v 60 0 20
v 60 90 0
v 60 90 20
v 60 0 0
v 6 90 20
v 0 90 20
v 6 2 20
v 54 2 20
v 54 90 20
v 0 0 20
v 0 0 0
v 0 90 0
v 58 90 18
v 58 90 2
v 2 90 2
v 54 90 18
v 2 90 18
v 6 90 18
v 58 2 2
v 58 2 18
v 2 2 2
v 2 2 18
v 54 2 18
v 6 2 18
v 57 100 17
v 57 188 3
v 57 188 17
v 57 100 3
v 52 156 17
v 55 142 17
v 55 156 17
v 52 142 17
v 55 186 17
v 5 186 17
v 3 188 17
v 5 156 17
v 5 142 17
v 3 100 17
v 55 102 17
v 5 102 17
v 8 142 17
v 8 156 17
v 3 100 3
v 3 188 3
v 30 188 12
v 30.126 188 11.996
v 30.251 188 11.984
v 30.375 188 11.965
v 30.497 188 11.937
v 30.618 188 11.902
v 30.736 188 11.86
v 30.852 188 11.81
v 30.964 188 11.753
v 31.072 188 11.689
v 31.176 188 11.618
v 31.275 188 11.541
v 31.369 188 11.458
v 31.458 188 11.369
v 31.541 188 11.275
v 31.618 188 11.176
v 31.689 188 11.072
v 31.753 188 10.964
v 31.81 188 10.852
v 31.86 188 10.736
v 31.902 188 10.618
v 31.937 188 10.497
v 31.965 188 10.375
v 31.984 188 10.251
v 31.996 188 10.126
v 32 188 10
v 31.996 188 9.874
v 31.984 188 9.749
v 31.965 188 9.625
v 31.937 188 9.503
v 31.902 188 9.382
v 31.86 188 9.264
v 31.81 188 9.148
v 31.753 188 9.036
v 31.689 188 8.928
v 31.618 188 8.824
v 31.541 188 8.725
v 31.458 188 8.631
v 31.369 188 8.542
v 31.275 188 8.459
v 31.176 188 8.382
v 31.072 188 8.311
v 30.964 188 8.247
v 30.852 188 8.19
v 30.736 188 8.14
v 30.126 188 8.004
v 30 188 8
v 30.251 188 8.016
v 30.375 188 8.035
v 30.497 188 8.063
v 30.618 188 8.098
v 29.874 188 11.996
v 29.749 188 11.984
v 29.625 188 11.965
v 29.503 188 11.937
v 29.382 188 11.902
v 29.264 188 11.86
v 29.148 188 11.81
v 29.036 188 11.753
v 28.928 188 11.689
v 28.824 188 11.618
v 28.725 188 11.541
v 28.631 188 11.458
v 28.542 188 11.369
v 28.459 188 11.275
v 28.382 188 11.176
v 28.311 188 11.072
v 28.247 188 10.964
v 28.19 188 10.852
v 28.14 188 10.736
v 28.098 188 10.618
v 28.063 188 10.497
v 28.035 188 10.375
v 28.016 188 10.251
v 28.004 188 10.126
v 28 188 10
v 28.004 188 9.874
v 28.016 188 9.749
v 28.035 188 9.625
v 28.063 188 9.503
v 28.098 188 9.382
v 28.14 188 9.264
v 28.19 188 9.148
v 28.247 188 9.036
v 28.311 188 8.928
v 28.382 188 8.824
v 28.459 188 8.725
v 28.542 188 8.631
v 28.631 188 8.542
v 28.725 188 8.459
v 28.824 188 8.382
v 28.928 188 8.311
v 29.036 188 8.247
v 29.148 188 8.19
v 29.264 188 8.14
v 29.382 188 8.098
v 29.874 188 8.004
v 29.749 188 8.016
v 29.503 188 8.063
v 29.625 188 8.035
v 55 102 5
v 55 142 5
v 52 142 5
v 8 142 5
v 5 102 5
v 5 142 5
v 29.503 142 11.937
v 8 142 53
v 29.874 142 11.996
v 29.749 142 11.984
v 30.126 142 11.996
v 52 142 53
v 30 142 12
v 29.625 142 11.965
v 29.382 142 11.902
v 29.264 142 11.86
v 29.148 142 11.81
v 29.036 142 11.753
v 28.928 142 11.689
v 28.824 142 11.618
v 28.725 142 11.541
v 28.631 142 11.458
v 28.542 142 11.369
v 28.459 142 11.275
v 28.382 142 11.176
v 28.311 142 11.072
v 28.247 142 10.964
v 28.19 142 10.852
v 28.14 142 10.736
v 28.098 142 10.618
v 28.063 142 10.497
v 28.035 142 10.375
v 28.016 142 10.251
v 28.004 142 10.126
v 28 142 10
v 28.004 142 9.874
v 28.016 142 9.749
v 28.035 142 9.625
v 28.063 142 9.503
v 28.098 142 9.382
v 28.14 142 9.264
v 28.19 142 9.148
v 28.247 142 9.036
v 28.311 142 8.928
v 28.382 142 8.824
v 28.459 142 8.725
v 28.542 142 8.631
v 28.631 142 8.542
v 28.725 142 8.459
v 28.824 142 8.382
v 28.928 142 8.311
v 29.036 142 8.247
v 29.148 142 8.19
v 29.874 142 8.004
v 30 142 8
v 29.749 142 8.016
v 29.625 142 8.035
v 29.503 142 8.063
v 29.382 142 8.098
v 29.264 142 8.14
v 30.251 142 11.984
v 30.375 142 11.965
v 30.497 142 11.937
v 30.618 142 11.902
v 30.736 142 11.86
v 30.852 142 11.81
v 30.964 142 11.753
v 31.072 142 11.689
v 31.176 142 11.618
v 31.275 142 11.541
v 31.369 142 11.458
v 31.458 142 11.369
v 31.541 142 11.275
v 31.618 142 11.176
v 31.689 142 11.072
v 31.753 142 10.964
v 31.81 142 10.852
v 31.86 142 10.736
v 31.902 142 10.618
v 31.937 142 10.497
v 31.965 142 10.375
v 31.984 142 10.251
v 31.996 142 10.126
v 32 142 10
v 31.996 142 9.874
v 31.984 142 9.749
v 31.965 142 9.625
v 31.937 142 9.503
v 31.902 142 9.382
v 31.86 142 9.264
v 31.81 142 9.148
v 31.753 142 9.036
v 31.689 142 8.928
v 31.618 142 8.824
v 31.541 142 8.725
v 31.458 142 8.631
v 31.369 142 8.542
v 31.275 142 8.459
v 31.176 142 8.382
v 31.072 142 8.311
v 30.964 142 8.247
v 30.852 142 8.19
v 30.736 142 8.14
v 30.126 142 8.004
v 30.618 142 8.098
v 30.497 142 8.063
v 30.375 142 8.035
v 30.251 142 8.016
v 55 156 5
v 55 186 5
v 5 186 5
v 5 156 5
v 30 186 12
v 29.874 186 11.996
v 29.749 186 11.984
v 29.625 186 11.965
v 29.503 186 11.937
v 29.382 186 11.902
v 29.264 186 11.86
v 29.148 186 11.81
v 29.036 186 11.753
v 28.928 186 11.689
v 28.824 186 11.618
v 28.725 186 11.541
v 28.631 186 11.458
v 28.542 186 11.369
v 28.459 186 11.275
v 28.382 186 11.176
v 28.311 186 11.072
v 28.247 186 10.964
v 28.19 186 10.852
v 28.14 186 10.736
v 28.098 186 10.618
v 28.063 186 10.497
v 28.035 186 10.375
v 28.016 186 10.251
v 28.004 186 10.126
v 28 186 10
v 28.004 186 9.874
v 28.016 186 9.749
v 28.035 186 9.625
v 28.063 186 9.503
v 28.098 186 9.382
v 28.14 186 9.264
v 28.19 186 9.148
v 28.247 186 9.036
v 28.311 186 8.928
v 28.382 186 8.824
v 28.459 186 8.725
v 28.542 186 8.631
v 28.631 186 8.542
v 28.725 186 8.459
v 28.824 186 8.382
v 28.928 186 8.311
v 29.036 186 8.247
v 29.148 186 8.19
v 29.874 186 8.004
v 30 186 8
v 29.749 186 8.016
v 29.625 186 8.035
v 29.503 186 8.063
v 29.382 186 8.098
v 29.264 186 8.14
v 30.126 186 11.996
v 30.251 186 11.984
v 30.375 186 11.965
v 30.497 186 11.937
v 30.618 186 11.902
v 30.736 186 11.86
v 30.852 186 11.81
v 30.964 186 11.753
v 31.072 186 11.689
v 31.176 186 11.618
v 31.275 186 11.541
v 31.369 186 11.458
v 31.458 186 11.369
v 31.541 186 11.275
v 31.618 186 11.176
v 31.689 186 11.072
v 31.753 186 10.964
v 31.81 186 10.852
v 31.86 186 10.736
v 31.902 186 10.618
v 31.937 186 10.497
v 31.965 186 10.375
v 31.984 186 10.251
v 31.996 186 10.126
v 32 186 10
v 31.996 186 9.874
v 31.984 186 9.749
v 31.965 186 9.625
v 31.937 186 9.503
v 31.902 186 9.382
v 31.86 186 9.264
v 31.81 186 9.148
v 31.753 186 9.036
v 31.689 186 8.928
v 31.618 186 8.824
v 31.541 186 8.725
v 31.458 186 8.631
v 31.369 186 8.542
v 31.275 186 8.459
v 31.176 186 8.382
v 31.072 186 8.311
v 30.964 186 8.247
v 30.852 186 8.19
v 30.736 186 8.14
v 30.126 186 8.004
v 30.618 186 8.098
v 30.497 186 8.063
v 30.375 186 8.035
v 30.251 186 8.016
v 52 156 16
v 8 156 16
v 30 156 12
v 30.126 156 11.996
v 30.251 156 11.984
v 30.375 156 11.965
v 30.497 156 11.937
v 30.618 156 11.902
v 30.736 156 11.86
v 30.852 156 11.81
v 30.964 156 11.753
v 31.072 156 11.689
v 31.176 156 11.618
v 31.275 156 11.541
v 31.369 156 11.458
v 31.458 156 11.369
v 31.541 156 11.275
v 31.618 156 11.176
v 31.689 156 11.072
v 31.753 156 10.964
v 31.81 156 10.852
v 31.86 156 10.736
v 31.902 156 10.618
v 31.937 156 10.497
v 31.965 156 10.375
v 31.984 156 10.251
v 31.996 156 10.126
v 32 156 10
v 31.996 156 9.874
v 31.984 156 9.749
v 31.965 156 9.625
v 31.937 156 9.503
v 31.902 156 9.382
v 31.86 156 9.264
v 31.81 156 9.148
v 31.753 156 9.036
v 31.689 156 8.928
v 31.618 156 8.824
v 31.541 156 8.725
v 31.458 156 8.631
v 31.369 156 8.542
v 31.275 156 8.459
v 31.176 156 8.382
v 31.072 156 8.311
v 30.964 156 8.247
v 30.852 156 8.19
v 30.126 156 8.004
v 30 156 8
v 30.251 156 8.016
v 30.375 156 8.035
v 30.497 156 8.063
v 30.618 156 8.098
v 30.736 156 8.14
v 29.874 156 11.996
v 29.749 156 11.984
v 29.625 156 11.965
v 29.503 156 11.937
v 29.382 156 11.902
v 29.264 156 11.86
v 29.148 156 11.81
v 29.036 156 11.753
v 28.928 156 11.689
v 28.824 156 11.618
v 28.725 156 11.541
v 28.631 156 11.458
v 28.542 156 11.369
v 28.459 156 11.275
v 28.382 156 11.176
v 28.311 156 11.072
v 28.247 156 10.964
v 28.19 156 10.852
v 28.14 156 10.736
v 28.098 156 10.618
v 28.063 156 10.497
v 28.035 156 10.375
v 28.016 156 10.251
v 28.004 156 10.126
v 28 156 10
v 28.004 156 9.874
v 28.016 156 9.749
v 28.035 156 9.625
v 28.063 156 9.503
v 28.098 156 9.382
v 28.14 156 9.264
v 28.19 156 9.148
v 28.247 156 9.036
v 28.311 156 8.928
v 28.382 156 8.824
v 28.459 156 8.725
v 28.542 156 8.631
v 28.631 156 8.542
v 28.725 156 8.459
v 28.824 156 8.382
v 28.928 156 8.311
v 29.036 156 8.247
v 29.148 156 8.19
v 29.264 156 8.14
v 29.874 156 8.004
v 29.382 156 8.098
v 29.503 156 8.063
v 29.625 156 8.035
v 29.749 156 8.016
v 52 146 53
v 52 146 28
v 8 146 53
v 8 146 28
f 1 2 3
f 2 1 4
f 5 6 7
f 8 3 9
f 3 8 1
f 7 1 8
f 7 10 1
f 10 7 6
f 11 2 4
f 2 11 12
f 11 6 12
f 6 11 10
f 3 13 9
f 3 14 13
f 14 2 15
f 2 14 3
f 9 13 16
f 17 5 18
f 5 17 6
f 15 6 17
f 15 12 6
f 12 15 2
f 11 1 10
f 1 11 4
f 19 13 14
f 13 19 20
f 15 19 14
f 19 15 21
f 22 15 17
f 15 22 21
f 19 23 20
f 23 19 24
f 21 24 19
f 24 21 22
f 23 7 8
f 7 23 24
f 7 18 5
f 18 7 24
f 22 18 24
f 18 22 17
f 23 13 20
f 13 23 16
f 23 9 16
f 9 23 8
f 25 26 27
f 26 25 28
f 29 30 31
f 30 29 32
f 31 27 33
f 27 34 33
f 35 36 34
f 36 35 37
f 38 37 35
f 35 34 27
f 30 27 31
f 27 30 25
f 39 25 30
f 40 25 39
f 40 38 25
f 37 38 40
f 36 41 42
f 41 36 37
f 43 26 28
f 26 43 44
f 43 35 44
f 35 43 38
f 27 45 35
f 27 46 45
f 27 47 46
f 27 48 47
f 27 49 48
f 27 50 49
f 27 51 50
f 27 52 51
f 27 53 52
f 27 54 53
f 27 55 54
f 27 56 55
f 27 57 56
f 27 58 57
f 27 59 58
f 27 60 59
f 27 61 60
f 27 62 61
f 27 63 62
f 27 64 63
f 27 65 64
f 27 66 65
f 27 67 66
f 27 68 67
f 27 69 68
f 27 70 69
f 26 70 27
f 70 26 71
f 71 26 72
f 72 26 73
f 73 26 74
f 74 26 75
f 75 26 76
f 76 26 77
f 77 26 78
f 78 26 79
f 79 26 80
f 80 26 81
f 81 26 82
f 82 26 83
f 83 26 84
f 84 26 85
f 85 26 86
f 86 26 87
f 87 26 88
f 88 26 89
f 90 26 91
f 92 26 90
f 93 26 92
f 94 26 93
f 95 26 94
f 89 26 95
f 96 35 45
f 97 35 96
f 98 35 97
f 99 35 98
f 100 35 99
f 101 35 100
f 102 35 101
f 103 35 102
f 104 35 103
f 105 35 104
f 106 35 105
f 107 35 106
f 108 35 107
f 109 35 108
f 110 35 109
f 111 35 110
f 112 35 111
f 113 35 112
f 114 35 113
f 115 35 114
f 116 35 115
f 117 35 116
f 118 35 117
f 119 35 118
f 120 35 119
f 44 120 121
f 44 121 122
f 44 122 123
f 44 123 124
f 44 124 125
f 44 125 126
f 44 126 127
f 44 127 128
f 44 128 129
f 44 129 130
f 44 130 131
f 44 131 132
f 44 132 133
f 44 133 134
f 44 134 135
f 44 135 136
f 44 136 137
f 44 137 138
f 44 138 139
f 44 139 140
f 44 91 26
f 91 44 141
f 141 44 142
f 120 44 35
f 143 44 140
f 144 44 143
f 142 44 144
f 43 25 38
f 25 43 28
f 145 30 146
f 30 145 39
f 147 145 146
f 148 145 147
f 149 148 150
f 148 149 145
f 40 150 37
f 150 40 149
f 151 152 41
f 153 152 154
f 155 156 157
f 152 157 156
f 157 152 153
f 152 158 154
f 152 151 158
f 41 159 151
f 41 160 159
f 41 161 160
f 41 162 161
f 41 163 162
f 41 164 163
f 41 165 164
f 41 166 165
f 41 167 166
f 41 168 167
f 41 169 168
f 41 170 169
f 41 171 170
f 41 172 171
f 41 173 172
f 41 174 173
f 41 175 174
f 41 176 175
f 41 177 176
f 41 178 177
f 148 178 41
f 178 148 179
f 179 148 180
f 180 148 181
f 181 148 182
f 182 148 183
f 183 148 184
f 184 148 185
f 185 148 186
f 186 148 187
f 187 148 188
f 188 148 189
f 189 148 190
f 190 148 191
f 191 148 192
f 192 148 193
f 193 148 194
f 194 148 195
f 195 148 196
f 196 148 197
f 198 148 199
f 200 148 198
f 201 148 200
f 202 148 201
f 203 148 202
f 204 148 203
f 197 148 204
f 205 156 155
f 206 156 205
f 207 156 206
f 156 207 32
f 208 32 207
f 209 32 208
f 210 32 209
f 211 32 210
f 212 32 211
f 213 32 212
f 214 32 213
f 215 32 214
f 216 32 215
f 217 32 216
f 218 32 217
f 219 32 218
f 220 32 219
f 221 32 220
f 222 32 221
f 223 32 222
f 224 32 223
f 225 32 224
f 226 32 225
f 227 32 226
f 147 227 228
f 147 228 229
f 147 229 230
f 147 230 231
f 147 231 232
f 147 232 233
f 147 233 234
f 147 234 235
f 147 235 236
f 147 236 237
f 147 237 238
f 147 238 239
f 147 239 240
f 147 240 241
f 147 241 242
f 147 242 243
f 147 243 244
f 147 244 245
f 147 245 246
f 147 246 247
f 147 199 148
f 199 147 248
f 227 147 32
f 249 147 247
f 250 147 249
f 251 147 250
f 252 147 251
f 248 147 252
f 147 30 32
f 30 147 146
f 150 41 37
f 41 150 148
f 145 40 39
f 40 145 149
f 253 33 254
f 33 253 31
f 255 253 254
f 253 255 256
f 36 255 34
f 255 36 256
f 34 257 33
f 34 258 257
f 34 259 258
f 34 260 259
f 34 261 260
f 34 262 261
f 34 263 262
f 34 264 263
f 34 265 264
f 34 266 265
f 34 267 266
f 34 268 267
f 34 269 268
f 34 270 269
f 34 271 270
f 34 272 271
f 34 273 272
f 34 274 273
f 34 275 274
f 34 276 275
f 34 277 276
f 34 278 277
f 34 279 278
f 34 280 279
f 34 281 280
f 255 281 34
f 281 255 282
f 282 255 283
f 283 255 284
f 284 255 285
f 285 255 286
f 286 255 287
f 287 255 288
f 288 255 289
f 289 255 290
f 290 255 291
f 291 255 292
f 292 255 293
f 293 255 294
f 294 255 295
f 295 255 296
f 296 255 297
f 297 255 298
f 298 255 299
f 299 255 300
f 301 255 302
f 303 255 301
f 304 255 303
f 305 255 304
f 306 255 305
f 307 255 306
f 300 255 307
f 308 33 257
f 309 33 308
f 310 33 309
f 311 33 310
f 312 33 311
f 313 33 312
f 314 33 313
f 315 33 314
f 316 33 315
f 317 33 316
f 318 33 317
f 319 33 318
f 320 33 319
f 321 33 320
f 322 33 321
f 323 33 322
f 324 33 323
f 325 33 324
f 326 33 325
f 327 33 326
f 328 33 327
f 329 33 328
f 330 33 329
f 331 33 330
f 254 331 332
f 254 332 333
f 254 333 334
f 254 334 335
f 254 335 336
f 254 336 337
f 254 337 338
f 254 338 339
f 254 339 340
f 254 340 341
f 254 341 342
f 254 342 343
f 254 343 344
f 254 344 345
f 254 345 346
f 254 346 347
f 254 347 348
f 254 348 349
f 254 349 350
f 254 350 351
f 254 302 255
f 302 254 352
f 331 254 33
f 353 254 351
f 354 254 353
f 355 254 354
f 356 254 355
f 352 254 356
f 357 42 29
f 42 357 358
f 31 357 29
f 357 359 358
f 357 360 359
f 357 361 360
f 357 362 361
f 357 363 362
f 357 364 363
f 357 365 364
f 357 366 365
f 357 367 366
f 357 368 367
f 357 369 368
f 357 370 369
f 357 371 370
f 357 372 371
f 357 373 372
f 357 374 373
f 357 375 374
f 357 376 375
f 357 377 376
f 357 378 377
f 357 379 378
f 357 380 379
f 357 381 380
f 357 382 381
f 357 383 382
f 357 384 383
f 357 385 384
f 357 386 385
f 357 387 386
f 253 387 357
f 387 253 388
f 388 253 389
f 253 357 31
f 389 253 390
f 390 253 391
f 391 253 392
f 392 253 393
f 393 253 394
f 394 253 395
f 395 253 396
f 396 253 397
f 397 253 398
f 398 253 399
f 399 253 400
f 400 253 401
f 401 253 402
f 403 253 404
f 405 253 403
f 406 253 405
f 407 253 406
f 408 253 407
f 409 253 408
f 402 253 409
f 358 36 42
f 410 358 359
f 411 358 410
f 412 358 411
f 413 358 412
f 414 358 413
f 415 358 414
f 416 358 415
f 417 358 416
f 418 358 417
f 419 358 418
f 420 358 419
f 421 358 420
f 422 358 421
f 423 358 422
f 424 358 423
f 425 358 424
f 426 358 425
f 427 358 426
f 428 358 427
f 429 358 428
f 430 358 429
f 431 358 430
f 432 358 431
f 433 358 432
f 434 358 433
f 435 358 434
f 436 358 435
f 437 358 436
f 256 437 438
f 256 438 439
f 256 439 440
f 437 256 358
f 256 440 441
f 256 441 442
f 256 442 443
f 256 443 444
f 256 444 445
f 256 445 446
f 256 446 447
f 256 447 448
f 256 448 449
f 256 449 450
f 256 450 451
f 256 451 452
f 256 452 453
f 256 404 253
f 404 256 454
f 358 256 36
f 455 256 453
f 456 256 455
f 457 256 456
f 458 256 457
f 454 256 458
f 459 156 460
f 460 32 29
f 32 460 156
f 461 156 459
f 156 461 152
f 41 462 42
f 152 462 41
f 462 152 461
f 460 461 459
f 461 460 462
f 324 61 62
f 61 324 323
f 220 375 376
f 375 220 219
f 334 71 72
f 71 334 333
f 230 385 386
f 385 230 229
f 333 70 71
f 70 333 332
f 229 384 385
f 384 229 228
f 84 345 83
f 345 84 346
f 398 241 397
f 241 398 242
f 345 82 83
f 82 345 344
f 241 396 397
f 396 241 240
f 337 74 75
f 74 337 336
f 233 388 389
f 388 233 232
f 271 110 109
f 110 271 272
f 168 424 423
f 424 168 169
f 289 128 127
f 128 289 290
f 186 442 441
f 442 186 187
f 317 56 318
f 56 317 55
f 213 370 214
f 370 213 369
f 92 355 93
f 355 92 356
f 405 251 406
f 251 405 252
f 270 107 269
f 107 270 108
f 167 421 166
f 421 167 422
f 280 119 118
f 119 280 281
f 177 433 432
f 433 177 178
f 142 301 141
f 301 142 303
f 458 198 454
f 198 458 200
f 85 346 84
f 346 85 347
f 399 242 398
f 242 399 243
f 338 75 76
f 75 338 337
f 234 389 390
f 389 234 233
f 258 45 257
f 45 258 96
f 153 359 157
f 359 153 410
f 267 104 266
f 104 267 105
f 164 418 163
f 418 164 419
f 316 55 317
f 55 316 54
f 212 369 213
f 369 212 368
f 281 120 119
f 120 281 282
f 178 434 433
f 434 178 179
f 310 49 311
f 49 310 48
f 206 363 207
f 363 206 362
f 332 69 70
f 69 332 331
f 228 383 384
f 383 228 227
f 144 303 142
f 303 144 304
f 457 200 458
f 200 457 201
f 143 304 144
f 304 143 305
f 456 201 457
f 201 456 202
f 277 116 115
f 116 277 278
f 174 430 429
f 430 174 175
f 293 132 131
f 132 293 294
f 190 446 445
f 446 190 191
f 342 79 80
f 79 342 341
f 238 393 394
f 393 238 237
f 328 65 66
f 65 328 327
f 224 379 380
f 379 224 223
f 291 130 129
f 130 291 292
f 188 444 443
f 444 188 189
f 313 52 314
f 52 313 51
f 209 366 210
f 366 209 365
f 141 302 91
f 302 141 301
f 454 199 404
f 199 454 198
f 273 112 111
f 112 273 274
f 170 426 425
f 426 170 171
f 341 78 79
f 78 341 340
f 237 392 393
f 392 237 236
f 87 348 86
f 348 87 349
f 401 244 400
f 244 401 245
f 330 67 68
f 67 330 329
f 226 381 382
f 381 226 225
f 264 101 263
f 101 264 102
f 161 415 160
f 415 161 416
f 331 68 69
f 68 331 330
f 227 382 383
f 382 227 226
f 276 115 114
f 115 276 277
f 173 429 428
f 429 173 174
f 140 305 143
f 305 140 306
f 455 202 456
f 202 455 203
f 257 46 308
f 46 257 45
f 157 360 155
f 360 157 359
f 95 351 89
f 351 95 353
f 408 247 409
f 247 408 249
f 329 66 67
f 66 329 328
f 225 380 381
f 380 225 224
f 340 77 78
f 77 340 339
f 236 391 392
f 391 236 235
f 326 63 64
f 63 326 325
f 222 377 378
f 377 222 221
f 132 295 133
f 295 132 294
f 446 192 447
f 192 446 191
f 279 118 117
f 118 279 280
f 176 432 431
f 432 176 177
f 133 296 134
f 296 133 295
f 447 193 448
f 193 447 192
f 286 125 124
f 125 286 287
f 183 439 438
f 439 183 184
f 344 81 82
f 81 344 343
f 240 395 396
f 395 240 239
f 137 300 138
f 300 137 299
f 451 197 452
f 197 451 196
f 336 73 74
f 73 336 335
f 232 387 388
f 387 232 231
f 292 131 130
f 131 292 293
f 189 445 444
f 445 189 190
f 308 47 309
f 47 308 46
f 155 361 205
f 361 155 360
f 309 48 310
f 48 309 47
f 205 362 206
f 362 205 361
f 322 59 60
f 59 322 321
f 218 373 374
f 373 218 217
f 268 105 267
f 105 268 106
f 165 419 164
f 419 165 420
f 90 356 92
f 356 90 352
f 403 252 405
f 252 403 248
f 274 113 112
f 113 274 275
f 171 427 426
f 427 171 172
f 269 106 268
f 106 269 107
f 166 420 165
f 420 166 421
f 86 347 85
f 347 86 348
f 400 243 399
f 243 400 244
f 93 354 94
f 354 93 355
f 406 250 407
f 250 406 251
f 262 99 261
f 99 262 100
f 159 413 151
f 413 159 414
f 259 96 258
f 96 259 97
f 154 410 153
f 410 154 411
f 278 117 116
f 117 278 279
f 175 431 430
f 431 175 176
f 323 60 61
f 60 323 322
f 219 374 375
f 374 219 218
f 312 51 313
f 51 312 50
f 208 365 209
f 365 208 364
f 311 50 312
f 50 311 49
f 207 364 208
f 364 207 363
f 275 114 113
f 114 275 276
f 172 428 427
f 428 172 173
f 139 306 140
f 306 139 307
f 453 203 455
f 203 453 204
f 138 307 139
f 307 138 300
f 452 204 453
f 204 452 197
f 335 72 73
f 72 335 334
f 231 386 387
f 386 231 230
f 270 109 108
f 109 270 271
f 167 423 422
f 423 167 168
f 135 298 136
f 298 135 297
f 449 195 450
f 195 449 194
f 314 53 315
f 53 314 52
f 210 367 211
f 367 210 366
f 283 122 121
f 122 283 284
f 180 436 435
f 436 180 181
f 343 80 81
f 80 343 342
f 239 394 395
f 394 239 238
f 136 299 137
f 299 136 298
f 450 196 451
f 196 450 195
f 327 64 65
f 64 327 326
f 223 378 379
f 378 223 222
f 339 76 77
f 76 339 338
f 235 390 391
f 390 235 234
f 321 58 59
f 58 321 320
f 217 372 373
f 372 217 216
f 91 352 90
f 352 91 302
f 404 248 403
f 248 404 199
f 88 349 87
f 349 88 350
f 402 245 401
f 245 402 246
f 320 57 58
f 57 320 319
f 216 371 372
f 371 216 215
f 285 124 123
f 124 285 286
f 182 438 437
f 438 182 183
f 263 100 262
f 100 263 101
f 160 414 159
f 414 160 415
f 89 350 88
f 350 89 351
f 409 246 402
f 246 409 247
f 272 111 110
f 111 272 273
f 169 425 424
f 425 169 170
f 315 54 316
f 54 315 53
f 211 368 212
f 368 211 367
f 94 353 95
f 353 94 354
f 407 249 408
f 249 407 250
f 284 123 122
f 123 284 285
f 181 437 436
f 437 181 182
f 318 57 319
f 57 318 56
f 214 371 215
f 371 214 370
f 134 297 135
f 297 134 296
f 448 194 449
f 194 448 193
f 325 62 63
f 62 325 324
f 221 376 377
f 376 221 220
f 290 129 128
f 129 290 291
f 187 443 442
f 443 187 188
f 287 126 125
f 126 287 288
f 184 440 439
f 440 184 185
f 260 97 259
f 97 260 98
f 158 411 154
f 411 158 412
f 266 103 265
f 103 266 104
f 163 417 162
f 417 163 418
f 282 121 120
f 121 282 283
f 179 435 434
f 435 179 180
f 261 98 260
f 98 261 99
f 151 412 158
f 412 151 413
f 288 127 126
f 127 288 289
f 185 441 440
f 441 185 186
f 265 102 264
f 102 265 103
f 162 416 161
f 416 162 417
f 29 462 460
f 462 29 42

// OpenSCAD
$fn=100;
wall = 2;
slack = 1;

baseplate();
translate([wall+slack,100,wall+slack])
    slider();


module baseplate() {
    
width = 60;
length = 90;
height = 20;

difference() {    
    cube([width,length,height]);
    translate([wall,wall,wall]) {
    cube([width-2*wall, length-1*wall, 999-2*wall]); }
}

// slider left
translate([wall, 0, height-2])
cube([4,length,wall]);

// slider right
translate([width-wall-4, 0, height-2])
cube([4,length,wall]);
}

module slider() {

width = 60-2*wall-2*slack;
length = 90-wall;
height = 20-2*wall-2*slack;
    
pedalHeight = 50;

difference() {
    union() {
        translate([4+slack, length/2-2 ,0])                                   // pedal
        cube([width-8-2*slack, 4, pedalHeight]);  

        difference() {  
            cube([width, length, height]);
        
            color("green")                                              // bottom hole
            translate([wall, wall, wall])
            cube([width-2*wall, length/2-2*wall, 999]);
    
            color("blue")                                               // top hole
            translate([wall, length/2+wall+10, wall])
            cube([width-2*wall, length/2-2*wall-10, 999]);
        }
    }
    translate([width/2, length/2-30 ,height/2])
        rotate([270, 0, 0])
            cylinder(r=2, h=999);
}

    
hull() {
// 3 cubes to build radius
color("red")   
translate([4+slack, length/2+1 ,height])
    cube([width-8-2*slack,1,1]);
color("red")   
translate([4+slack, length/2+1 ,height+10])
    cube([width-8-2*slack,1,1]);
color("red") 
translate([4+slack, length/2+11 ,height-1])
    cube([width-8-2*slack,1,1]);
}
}
